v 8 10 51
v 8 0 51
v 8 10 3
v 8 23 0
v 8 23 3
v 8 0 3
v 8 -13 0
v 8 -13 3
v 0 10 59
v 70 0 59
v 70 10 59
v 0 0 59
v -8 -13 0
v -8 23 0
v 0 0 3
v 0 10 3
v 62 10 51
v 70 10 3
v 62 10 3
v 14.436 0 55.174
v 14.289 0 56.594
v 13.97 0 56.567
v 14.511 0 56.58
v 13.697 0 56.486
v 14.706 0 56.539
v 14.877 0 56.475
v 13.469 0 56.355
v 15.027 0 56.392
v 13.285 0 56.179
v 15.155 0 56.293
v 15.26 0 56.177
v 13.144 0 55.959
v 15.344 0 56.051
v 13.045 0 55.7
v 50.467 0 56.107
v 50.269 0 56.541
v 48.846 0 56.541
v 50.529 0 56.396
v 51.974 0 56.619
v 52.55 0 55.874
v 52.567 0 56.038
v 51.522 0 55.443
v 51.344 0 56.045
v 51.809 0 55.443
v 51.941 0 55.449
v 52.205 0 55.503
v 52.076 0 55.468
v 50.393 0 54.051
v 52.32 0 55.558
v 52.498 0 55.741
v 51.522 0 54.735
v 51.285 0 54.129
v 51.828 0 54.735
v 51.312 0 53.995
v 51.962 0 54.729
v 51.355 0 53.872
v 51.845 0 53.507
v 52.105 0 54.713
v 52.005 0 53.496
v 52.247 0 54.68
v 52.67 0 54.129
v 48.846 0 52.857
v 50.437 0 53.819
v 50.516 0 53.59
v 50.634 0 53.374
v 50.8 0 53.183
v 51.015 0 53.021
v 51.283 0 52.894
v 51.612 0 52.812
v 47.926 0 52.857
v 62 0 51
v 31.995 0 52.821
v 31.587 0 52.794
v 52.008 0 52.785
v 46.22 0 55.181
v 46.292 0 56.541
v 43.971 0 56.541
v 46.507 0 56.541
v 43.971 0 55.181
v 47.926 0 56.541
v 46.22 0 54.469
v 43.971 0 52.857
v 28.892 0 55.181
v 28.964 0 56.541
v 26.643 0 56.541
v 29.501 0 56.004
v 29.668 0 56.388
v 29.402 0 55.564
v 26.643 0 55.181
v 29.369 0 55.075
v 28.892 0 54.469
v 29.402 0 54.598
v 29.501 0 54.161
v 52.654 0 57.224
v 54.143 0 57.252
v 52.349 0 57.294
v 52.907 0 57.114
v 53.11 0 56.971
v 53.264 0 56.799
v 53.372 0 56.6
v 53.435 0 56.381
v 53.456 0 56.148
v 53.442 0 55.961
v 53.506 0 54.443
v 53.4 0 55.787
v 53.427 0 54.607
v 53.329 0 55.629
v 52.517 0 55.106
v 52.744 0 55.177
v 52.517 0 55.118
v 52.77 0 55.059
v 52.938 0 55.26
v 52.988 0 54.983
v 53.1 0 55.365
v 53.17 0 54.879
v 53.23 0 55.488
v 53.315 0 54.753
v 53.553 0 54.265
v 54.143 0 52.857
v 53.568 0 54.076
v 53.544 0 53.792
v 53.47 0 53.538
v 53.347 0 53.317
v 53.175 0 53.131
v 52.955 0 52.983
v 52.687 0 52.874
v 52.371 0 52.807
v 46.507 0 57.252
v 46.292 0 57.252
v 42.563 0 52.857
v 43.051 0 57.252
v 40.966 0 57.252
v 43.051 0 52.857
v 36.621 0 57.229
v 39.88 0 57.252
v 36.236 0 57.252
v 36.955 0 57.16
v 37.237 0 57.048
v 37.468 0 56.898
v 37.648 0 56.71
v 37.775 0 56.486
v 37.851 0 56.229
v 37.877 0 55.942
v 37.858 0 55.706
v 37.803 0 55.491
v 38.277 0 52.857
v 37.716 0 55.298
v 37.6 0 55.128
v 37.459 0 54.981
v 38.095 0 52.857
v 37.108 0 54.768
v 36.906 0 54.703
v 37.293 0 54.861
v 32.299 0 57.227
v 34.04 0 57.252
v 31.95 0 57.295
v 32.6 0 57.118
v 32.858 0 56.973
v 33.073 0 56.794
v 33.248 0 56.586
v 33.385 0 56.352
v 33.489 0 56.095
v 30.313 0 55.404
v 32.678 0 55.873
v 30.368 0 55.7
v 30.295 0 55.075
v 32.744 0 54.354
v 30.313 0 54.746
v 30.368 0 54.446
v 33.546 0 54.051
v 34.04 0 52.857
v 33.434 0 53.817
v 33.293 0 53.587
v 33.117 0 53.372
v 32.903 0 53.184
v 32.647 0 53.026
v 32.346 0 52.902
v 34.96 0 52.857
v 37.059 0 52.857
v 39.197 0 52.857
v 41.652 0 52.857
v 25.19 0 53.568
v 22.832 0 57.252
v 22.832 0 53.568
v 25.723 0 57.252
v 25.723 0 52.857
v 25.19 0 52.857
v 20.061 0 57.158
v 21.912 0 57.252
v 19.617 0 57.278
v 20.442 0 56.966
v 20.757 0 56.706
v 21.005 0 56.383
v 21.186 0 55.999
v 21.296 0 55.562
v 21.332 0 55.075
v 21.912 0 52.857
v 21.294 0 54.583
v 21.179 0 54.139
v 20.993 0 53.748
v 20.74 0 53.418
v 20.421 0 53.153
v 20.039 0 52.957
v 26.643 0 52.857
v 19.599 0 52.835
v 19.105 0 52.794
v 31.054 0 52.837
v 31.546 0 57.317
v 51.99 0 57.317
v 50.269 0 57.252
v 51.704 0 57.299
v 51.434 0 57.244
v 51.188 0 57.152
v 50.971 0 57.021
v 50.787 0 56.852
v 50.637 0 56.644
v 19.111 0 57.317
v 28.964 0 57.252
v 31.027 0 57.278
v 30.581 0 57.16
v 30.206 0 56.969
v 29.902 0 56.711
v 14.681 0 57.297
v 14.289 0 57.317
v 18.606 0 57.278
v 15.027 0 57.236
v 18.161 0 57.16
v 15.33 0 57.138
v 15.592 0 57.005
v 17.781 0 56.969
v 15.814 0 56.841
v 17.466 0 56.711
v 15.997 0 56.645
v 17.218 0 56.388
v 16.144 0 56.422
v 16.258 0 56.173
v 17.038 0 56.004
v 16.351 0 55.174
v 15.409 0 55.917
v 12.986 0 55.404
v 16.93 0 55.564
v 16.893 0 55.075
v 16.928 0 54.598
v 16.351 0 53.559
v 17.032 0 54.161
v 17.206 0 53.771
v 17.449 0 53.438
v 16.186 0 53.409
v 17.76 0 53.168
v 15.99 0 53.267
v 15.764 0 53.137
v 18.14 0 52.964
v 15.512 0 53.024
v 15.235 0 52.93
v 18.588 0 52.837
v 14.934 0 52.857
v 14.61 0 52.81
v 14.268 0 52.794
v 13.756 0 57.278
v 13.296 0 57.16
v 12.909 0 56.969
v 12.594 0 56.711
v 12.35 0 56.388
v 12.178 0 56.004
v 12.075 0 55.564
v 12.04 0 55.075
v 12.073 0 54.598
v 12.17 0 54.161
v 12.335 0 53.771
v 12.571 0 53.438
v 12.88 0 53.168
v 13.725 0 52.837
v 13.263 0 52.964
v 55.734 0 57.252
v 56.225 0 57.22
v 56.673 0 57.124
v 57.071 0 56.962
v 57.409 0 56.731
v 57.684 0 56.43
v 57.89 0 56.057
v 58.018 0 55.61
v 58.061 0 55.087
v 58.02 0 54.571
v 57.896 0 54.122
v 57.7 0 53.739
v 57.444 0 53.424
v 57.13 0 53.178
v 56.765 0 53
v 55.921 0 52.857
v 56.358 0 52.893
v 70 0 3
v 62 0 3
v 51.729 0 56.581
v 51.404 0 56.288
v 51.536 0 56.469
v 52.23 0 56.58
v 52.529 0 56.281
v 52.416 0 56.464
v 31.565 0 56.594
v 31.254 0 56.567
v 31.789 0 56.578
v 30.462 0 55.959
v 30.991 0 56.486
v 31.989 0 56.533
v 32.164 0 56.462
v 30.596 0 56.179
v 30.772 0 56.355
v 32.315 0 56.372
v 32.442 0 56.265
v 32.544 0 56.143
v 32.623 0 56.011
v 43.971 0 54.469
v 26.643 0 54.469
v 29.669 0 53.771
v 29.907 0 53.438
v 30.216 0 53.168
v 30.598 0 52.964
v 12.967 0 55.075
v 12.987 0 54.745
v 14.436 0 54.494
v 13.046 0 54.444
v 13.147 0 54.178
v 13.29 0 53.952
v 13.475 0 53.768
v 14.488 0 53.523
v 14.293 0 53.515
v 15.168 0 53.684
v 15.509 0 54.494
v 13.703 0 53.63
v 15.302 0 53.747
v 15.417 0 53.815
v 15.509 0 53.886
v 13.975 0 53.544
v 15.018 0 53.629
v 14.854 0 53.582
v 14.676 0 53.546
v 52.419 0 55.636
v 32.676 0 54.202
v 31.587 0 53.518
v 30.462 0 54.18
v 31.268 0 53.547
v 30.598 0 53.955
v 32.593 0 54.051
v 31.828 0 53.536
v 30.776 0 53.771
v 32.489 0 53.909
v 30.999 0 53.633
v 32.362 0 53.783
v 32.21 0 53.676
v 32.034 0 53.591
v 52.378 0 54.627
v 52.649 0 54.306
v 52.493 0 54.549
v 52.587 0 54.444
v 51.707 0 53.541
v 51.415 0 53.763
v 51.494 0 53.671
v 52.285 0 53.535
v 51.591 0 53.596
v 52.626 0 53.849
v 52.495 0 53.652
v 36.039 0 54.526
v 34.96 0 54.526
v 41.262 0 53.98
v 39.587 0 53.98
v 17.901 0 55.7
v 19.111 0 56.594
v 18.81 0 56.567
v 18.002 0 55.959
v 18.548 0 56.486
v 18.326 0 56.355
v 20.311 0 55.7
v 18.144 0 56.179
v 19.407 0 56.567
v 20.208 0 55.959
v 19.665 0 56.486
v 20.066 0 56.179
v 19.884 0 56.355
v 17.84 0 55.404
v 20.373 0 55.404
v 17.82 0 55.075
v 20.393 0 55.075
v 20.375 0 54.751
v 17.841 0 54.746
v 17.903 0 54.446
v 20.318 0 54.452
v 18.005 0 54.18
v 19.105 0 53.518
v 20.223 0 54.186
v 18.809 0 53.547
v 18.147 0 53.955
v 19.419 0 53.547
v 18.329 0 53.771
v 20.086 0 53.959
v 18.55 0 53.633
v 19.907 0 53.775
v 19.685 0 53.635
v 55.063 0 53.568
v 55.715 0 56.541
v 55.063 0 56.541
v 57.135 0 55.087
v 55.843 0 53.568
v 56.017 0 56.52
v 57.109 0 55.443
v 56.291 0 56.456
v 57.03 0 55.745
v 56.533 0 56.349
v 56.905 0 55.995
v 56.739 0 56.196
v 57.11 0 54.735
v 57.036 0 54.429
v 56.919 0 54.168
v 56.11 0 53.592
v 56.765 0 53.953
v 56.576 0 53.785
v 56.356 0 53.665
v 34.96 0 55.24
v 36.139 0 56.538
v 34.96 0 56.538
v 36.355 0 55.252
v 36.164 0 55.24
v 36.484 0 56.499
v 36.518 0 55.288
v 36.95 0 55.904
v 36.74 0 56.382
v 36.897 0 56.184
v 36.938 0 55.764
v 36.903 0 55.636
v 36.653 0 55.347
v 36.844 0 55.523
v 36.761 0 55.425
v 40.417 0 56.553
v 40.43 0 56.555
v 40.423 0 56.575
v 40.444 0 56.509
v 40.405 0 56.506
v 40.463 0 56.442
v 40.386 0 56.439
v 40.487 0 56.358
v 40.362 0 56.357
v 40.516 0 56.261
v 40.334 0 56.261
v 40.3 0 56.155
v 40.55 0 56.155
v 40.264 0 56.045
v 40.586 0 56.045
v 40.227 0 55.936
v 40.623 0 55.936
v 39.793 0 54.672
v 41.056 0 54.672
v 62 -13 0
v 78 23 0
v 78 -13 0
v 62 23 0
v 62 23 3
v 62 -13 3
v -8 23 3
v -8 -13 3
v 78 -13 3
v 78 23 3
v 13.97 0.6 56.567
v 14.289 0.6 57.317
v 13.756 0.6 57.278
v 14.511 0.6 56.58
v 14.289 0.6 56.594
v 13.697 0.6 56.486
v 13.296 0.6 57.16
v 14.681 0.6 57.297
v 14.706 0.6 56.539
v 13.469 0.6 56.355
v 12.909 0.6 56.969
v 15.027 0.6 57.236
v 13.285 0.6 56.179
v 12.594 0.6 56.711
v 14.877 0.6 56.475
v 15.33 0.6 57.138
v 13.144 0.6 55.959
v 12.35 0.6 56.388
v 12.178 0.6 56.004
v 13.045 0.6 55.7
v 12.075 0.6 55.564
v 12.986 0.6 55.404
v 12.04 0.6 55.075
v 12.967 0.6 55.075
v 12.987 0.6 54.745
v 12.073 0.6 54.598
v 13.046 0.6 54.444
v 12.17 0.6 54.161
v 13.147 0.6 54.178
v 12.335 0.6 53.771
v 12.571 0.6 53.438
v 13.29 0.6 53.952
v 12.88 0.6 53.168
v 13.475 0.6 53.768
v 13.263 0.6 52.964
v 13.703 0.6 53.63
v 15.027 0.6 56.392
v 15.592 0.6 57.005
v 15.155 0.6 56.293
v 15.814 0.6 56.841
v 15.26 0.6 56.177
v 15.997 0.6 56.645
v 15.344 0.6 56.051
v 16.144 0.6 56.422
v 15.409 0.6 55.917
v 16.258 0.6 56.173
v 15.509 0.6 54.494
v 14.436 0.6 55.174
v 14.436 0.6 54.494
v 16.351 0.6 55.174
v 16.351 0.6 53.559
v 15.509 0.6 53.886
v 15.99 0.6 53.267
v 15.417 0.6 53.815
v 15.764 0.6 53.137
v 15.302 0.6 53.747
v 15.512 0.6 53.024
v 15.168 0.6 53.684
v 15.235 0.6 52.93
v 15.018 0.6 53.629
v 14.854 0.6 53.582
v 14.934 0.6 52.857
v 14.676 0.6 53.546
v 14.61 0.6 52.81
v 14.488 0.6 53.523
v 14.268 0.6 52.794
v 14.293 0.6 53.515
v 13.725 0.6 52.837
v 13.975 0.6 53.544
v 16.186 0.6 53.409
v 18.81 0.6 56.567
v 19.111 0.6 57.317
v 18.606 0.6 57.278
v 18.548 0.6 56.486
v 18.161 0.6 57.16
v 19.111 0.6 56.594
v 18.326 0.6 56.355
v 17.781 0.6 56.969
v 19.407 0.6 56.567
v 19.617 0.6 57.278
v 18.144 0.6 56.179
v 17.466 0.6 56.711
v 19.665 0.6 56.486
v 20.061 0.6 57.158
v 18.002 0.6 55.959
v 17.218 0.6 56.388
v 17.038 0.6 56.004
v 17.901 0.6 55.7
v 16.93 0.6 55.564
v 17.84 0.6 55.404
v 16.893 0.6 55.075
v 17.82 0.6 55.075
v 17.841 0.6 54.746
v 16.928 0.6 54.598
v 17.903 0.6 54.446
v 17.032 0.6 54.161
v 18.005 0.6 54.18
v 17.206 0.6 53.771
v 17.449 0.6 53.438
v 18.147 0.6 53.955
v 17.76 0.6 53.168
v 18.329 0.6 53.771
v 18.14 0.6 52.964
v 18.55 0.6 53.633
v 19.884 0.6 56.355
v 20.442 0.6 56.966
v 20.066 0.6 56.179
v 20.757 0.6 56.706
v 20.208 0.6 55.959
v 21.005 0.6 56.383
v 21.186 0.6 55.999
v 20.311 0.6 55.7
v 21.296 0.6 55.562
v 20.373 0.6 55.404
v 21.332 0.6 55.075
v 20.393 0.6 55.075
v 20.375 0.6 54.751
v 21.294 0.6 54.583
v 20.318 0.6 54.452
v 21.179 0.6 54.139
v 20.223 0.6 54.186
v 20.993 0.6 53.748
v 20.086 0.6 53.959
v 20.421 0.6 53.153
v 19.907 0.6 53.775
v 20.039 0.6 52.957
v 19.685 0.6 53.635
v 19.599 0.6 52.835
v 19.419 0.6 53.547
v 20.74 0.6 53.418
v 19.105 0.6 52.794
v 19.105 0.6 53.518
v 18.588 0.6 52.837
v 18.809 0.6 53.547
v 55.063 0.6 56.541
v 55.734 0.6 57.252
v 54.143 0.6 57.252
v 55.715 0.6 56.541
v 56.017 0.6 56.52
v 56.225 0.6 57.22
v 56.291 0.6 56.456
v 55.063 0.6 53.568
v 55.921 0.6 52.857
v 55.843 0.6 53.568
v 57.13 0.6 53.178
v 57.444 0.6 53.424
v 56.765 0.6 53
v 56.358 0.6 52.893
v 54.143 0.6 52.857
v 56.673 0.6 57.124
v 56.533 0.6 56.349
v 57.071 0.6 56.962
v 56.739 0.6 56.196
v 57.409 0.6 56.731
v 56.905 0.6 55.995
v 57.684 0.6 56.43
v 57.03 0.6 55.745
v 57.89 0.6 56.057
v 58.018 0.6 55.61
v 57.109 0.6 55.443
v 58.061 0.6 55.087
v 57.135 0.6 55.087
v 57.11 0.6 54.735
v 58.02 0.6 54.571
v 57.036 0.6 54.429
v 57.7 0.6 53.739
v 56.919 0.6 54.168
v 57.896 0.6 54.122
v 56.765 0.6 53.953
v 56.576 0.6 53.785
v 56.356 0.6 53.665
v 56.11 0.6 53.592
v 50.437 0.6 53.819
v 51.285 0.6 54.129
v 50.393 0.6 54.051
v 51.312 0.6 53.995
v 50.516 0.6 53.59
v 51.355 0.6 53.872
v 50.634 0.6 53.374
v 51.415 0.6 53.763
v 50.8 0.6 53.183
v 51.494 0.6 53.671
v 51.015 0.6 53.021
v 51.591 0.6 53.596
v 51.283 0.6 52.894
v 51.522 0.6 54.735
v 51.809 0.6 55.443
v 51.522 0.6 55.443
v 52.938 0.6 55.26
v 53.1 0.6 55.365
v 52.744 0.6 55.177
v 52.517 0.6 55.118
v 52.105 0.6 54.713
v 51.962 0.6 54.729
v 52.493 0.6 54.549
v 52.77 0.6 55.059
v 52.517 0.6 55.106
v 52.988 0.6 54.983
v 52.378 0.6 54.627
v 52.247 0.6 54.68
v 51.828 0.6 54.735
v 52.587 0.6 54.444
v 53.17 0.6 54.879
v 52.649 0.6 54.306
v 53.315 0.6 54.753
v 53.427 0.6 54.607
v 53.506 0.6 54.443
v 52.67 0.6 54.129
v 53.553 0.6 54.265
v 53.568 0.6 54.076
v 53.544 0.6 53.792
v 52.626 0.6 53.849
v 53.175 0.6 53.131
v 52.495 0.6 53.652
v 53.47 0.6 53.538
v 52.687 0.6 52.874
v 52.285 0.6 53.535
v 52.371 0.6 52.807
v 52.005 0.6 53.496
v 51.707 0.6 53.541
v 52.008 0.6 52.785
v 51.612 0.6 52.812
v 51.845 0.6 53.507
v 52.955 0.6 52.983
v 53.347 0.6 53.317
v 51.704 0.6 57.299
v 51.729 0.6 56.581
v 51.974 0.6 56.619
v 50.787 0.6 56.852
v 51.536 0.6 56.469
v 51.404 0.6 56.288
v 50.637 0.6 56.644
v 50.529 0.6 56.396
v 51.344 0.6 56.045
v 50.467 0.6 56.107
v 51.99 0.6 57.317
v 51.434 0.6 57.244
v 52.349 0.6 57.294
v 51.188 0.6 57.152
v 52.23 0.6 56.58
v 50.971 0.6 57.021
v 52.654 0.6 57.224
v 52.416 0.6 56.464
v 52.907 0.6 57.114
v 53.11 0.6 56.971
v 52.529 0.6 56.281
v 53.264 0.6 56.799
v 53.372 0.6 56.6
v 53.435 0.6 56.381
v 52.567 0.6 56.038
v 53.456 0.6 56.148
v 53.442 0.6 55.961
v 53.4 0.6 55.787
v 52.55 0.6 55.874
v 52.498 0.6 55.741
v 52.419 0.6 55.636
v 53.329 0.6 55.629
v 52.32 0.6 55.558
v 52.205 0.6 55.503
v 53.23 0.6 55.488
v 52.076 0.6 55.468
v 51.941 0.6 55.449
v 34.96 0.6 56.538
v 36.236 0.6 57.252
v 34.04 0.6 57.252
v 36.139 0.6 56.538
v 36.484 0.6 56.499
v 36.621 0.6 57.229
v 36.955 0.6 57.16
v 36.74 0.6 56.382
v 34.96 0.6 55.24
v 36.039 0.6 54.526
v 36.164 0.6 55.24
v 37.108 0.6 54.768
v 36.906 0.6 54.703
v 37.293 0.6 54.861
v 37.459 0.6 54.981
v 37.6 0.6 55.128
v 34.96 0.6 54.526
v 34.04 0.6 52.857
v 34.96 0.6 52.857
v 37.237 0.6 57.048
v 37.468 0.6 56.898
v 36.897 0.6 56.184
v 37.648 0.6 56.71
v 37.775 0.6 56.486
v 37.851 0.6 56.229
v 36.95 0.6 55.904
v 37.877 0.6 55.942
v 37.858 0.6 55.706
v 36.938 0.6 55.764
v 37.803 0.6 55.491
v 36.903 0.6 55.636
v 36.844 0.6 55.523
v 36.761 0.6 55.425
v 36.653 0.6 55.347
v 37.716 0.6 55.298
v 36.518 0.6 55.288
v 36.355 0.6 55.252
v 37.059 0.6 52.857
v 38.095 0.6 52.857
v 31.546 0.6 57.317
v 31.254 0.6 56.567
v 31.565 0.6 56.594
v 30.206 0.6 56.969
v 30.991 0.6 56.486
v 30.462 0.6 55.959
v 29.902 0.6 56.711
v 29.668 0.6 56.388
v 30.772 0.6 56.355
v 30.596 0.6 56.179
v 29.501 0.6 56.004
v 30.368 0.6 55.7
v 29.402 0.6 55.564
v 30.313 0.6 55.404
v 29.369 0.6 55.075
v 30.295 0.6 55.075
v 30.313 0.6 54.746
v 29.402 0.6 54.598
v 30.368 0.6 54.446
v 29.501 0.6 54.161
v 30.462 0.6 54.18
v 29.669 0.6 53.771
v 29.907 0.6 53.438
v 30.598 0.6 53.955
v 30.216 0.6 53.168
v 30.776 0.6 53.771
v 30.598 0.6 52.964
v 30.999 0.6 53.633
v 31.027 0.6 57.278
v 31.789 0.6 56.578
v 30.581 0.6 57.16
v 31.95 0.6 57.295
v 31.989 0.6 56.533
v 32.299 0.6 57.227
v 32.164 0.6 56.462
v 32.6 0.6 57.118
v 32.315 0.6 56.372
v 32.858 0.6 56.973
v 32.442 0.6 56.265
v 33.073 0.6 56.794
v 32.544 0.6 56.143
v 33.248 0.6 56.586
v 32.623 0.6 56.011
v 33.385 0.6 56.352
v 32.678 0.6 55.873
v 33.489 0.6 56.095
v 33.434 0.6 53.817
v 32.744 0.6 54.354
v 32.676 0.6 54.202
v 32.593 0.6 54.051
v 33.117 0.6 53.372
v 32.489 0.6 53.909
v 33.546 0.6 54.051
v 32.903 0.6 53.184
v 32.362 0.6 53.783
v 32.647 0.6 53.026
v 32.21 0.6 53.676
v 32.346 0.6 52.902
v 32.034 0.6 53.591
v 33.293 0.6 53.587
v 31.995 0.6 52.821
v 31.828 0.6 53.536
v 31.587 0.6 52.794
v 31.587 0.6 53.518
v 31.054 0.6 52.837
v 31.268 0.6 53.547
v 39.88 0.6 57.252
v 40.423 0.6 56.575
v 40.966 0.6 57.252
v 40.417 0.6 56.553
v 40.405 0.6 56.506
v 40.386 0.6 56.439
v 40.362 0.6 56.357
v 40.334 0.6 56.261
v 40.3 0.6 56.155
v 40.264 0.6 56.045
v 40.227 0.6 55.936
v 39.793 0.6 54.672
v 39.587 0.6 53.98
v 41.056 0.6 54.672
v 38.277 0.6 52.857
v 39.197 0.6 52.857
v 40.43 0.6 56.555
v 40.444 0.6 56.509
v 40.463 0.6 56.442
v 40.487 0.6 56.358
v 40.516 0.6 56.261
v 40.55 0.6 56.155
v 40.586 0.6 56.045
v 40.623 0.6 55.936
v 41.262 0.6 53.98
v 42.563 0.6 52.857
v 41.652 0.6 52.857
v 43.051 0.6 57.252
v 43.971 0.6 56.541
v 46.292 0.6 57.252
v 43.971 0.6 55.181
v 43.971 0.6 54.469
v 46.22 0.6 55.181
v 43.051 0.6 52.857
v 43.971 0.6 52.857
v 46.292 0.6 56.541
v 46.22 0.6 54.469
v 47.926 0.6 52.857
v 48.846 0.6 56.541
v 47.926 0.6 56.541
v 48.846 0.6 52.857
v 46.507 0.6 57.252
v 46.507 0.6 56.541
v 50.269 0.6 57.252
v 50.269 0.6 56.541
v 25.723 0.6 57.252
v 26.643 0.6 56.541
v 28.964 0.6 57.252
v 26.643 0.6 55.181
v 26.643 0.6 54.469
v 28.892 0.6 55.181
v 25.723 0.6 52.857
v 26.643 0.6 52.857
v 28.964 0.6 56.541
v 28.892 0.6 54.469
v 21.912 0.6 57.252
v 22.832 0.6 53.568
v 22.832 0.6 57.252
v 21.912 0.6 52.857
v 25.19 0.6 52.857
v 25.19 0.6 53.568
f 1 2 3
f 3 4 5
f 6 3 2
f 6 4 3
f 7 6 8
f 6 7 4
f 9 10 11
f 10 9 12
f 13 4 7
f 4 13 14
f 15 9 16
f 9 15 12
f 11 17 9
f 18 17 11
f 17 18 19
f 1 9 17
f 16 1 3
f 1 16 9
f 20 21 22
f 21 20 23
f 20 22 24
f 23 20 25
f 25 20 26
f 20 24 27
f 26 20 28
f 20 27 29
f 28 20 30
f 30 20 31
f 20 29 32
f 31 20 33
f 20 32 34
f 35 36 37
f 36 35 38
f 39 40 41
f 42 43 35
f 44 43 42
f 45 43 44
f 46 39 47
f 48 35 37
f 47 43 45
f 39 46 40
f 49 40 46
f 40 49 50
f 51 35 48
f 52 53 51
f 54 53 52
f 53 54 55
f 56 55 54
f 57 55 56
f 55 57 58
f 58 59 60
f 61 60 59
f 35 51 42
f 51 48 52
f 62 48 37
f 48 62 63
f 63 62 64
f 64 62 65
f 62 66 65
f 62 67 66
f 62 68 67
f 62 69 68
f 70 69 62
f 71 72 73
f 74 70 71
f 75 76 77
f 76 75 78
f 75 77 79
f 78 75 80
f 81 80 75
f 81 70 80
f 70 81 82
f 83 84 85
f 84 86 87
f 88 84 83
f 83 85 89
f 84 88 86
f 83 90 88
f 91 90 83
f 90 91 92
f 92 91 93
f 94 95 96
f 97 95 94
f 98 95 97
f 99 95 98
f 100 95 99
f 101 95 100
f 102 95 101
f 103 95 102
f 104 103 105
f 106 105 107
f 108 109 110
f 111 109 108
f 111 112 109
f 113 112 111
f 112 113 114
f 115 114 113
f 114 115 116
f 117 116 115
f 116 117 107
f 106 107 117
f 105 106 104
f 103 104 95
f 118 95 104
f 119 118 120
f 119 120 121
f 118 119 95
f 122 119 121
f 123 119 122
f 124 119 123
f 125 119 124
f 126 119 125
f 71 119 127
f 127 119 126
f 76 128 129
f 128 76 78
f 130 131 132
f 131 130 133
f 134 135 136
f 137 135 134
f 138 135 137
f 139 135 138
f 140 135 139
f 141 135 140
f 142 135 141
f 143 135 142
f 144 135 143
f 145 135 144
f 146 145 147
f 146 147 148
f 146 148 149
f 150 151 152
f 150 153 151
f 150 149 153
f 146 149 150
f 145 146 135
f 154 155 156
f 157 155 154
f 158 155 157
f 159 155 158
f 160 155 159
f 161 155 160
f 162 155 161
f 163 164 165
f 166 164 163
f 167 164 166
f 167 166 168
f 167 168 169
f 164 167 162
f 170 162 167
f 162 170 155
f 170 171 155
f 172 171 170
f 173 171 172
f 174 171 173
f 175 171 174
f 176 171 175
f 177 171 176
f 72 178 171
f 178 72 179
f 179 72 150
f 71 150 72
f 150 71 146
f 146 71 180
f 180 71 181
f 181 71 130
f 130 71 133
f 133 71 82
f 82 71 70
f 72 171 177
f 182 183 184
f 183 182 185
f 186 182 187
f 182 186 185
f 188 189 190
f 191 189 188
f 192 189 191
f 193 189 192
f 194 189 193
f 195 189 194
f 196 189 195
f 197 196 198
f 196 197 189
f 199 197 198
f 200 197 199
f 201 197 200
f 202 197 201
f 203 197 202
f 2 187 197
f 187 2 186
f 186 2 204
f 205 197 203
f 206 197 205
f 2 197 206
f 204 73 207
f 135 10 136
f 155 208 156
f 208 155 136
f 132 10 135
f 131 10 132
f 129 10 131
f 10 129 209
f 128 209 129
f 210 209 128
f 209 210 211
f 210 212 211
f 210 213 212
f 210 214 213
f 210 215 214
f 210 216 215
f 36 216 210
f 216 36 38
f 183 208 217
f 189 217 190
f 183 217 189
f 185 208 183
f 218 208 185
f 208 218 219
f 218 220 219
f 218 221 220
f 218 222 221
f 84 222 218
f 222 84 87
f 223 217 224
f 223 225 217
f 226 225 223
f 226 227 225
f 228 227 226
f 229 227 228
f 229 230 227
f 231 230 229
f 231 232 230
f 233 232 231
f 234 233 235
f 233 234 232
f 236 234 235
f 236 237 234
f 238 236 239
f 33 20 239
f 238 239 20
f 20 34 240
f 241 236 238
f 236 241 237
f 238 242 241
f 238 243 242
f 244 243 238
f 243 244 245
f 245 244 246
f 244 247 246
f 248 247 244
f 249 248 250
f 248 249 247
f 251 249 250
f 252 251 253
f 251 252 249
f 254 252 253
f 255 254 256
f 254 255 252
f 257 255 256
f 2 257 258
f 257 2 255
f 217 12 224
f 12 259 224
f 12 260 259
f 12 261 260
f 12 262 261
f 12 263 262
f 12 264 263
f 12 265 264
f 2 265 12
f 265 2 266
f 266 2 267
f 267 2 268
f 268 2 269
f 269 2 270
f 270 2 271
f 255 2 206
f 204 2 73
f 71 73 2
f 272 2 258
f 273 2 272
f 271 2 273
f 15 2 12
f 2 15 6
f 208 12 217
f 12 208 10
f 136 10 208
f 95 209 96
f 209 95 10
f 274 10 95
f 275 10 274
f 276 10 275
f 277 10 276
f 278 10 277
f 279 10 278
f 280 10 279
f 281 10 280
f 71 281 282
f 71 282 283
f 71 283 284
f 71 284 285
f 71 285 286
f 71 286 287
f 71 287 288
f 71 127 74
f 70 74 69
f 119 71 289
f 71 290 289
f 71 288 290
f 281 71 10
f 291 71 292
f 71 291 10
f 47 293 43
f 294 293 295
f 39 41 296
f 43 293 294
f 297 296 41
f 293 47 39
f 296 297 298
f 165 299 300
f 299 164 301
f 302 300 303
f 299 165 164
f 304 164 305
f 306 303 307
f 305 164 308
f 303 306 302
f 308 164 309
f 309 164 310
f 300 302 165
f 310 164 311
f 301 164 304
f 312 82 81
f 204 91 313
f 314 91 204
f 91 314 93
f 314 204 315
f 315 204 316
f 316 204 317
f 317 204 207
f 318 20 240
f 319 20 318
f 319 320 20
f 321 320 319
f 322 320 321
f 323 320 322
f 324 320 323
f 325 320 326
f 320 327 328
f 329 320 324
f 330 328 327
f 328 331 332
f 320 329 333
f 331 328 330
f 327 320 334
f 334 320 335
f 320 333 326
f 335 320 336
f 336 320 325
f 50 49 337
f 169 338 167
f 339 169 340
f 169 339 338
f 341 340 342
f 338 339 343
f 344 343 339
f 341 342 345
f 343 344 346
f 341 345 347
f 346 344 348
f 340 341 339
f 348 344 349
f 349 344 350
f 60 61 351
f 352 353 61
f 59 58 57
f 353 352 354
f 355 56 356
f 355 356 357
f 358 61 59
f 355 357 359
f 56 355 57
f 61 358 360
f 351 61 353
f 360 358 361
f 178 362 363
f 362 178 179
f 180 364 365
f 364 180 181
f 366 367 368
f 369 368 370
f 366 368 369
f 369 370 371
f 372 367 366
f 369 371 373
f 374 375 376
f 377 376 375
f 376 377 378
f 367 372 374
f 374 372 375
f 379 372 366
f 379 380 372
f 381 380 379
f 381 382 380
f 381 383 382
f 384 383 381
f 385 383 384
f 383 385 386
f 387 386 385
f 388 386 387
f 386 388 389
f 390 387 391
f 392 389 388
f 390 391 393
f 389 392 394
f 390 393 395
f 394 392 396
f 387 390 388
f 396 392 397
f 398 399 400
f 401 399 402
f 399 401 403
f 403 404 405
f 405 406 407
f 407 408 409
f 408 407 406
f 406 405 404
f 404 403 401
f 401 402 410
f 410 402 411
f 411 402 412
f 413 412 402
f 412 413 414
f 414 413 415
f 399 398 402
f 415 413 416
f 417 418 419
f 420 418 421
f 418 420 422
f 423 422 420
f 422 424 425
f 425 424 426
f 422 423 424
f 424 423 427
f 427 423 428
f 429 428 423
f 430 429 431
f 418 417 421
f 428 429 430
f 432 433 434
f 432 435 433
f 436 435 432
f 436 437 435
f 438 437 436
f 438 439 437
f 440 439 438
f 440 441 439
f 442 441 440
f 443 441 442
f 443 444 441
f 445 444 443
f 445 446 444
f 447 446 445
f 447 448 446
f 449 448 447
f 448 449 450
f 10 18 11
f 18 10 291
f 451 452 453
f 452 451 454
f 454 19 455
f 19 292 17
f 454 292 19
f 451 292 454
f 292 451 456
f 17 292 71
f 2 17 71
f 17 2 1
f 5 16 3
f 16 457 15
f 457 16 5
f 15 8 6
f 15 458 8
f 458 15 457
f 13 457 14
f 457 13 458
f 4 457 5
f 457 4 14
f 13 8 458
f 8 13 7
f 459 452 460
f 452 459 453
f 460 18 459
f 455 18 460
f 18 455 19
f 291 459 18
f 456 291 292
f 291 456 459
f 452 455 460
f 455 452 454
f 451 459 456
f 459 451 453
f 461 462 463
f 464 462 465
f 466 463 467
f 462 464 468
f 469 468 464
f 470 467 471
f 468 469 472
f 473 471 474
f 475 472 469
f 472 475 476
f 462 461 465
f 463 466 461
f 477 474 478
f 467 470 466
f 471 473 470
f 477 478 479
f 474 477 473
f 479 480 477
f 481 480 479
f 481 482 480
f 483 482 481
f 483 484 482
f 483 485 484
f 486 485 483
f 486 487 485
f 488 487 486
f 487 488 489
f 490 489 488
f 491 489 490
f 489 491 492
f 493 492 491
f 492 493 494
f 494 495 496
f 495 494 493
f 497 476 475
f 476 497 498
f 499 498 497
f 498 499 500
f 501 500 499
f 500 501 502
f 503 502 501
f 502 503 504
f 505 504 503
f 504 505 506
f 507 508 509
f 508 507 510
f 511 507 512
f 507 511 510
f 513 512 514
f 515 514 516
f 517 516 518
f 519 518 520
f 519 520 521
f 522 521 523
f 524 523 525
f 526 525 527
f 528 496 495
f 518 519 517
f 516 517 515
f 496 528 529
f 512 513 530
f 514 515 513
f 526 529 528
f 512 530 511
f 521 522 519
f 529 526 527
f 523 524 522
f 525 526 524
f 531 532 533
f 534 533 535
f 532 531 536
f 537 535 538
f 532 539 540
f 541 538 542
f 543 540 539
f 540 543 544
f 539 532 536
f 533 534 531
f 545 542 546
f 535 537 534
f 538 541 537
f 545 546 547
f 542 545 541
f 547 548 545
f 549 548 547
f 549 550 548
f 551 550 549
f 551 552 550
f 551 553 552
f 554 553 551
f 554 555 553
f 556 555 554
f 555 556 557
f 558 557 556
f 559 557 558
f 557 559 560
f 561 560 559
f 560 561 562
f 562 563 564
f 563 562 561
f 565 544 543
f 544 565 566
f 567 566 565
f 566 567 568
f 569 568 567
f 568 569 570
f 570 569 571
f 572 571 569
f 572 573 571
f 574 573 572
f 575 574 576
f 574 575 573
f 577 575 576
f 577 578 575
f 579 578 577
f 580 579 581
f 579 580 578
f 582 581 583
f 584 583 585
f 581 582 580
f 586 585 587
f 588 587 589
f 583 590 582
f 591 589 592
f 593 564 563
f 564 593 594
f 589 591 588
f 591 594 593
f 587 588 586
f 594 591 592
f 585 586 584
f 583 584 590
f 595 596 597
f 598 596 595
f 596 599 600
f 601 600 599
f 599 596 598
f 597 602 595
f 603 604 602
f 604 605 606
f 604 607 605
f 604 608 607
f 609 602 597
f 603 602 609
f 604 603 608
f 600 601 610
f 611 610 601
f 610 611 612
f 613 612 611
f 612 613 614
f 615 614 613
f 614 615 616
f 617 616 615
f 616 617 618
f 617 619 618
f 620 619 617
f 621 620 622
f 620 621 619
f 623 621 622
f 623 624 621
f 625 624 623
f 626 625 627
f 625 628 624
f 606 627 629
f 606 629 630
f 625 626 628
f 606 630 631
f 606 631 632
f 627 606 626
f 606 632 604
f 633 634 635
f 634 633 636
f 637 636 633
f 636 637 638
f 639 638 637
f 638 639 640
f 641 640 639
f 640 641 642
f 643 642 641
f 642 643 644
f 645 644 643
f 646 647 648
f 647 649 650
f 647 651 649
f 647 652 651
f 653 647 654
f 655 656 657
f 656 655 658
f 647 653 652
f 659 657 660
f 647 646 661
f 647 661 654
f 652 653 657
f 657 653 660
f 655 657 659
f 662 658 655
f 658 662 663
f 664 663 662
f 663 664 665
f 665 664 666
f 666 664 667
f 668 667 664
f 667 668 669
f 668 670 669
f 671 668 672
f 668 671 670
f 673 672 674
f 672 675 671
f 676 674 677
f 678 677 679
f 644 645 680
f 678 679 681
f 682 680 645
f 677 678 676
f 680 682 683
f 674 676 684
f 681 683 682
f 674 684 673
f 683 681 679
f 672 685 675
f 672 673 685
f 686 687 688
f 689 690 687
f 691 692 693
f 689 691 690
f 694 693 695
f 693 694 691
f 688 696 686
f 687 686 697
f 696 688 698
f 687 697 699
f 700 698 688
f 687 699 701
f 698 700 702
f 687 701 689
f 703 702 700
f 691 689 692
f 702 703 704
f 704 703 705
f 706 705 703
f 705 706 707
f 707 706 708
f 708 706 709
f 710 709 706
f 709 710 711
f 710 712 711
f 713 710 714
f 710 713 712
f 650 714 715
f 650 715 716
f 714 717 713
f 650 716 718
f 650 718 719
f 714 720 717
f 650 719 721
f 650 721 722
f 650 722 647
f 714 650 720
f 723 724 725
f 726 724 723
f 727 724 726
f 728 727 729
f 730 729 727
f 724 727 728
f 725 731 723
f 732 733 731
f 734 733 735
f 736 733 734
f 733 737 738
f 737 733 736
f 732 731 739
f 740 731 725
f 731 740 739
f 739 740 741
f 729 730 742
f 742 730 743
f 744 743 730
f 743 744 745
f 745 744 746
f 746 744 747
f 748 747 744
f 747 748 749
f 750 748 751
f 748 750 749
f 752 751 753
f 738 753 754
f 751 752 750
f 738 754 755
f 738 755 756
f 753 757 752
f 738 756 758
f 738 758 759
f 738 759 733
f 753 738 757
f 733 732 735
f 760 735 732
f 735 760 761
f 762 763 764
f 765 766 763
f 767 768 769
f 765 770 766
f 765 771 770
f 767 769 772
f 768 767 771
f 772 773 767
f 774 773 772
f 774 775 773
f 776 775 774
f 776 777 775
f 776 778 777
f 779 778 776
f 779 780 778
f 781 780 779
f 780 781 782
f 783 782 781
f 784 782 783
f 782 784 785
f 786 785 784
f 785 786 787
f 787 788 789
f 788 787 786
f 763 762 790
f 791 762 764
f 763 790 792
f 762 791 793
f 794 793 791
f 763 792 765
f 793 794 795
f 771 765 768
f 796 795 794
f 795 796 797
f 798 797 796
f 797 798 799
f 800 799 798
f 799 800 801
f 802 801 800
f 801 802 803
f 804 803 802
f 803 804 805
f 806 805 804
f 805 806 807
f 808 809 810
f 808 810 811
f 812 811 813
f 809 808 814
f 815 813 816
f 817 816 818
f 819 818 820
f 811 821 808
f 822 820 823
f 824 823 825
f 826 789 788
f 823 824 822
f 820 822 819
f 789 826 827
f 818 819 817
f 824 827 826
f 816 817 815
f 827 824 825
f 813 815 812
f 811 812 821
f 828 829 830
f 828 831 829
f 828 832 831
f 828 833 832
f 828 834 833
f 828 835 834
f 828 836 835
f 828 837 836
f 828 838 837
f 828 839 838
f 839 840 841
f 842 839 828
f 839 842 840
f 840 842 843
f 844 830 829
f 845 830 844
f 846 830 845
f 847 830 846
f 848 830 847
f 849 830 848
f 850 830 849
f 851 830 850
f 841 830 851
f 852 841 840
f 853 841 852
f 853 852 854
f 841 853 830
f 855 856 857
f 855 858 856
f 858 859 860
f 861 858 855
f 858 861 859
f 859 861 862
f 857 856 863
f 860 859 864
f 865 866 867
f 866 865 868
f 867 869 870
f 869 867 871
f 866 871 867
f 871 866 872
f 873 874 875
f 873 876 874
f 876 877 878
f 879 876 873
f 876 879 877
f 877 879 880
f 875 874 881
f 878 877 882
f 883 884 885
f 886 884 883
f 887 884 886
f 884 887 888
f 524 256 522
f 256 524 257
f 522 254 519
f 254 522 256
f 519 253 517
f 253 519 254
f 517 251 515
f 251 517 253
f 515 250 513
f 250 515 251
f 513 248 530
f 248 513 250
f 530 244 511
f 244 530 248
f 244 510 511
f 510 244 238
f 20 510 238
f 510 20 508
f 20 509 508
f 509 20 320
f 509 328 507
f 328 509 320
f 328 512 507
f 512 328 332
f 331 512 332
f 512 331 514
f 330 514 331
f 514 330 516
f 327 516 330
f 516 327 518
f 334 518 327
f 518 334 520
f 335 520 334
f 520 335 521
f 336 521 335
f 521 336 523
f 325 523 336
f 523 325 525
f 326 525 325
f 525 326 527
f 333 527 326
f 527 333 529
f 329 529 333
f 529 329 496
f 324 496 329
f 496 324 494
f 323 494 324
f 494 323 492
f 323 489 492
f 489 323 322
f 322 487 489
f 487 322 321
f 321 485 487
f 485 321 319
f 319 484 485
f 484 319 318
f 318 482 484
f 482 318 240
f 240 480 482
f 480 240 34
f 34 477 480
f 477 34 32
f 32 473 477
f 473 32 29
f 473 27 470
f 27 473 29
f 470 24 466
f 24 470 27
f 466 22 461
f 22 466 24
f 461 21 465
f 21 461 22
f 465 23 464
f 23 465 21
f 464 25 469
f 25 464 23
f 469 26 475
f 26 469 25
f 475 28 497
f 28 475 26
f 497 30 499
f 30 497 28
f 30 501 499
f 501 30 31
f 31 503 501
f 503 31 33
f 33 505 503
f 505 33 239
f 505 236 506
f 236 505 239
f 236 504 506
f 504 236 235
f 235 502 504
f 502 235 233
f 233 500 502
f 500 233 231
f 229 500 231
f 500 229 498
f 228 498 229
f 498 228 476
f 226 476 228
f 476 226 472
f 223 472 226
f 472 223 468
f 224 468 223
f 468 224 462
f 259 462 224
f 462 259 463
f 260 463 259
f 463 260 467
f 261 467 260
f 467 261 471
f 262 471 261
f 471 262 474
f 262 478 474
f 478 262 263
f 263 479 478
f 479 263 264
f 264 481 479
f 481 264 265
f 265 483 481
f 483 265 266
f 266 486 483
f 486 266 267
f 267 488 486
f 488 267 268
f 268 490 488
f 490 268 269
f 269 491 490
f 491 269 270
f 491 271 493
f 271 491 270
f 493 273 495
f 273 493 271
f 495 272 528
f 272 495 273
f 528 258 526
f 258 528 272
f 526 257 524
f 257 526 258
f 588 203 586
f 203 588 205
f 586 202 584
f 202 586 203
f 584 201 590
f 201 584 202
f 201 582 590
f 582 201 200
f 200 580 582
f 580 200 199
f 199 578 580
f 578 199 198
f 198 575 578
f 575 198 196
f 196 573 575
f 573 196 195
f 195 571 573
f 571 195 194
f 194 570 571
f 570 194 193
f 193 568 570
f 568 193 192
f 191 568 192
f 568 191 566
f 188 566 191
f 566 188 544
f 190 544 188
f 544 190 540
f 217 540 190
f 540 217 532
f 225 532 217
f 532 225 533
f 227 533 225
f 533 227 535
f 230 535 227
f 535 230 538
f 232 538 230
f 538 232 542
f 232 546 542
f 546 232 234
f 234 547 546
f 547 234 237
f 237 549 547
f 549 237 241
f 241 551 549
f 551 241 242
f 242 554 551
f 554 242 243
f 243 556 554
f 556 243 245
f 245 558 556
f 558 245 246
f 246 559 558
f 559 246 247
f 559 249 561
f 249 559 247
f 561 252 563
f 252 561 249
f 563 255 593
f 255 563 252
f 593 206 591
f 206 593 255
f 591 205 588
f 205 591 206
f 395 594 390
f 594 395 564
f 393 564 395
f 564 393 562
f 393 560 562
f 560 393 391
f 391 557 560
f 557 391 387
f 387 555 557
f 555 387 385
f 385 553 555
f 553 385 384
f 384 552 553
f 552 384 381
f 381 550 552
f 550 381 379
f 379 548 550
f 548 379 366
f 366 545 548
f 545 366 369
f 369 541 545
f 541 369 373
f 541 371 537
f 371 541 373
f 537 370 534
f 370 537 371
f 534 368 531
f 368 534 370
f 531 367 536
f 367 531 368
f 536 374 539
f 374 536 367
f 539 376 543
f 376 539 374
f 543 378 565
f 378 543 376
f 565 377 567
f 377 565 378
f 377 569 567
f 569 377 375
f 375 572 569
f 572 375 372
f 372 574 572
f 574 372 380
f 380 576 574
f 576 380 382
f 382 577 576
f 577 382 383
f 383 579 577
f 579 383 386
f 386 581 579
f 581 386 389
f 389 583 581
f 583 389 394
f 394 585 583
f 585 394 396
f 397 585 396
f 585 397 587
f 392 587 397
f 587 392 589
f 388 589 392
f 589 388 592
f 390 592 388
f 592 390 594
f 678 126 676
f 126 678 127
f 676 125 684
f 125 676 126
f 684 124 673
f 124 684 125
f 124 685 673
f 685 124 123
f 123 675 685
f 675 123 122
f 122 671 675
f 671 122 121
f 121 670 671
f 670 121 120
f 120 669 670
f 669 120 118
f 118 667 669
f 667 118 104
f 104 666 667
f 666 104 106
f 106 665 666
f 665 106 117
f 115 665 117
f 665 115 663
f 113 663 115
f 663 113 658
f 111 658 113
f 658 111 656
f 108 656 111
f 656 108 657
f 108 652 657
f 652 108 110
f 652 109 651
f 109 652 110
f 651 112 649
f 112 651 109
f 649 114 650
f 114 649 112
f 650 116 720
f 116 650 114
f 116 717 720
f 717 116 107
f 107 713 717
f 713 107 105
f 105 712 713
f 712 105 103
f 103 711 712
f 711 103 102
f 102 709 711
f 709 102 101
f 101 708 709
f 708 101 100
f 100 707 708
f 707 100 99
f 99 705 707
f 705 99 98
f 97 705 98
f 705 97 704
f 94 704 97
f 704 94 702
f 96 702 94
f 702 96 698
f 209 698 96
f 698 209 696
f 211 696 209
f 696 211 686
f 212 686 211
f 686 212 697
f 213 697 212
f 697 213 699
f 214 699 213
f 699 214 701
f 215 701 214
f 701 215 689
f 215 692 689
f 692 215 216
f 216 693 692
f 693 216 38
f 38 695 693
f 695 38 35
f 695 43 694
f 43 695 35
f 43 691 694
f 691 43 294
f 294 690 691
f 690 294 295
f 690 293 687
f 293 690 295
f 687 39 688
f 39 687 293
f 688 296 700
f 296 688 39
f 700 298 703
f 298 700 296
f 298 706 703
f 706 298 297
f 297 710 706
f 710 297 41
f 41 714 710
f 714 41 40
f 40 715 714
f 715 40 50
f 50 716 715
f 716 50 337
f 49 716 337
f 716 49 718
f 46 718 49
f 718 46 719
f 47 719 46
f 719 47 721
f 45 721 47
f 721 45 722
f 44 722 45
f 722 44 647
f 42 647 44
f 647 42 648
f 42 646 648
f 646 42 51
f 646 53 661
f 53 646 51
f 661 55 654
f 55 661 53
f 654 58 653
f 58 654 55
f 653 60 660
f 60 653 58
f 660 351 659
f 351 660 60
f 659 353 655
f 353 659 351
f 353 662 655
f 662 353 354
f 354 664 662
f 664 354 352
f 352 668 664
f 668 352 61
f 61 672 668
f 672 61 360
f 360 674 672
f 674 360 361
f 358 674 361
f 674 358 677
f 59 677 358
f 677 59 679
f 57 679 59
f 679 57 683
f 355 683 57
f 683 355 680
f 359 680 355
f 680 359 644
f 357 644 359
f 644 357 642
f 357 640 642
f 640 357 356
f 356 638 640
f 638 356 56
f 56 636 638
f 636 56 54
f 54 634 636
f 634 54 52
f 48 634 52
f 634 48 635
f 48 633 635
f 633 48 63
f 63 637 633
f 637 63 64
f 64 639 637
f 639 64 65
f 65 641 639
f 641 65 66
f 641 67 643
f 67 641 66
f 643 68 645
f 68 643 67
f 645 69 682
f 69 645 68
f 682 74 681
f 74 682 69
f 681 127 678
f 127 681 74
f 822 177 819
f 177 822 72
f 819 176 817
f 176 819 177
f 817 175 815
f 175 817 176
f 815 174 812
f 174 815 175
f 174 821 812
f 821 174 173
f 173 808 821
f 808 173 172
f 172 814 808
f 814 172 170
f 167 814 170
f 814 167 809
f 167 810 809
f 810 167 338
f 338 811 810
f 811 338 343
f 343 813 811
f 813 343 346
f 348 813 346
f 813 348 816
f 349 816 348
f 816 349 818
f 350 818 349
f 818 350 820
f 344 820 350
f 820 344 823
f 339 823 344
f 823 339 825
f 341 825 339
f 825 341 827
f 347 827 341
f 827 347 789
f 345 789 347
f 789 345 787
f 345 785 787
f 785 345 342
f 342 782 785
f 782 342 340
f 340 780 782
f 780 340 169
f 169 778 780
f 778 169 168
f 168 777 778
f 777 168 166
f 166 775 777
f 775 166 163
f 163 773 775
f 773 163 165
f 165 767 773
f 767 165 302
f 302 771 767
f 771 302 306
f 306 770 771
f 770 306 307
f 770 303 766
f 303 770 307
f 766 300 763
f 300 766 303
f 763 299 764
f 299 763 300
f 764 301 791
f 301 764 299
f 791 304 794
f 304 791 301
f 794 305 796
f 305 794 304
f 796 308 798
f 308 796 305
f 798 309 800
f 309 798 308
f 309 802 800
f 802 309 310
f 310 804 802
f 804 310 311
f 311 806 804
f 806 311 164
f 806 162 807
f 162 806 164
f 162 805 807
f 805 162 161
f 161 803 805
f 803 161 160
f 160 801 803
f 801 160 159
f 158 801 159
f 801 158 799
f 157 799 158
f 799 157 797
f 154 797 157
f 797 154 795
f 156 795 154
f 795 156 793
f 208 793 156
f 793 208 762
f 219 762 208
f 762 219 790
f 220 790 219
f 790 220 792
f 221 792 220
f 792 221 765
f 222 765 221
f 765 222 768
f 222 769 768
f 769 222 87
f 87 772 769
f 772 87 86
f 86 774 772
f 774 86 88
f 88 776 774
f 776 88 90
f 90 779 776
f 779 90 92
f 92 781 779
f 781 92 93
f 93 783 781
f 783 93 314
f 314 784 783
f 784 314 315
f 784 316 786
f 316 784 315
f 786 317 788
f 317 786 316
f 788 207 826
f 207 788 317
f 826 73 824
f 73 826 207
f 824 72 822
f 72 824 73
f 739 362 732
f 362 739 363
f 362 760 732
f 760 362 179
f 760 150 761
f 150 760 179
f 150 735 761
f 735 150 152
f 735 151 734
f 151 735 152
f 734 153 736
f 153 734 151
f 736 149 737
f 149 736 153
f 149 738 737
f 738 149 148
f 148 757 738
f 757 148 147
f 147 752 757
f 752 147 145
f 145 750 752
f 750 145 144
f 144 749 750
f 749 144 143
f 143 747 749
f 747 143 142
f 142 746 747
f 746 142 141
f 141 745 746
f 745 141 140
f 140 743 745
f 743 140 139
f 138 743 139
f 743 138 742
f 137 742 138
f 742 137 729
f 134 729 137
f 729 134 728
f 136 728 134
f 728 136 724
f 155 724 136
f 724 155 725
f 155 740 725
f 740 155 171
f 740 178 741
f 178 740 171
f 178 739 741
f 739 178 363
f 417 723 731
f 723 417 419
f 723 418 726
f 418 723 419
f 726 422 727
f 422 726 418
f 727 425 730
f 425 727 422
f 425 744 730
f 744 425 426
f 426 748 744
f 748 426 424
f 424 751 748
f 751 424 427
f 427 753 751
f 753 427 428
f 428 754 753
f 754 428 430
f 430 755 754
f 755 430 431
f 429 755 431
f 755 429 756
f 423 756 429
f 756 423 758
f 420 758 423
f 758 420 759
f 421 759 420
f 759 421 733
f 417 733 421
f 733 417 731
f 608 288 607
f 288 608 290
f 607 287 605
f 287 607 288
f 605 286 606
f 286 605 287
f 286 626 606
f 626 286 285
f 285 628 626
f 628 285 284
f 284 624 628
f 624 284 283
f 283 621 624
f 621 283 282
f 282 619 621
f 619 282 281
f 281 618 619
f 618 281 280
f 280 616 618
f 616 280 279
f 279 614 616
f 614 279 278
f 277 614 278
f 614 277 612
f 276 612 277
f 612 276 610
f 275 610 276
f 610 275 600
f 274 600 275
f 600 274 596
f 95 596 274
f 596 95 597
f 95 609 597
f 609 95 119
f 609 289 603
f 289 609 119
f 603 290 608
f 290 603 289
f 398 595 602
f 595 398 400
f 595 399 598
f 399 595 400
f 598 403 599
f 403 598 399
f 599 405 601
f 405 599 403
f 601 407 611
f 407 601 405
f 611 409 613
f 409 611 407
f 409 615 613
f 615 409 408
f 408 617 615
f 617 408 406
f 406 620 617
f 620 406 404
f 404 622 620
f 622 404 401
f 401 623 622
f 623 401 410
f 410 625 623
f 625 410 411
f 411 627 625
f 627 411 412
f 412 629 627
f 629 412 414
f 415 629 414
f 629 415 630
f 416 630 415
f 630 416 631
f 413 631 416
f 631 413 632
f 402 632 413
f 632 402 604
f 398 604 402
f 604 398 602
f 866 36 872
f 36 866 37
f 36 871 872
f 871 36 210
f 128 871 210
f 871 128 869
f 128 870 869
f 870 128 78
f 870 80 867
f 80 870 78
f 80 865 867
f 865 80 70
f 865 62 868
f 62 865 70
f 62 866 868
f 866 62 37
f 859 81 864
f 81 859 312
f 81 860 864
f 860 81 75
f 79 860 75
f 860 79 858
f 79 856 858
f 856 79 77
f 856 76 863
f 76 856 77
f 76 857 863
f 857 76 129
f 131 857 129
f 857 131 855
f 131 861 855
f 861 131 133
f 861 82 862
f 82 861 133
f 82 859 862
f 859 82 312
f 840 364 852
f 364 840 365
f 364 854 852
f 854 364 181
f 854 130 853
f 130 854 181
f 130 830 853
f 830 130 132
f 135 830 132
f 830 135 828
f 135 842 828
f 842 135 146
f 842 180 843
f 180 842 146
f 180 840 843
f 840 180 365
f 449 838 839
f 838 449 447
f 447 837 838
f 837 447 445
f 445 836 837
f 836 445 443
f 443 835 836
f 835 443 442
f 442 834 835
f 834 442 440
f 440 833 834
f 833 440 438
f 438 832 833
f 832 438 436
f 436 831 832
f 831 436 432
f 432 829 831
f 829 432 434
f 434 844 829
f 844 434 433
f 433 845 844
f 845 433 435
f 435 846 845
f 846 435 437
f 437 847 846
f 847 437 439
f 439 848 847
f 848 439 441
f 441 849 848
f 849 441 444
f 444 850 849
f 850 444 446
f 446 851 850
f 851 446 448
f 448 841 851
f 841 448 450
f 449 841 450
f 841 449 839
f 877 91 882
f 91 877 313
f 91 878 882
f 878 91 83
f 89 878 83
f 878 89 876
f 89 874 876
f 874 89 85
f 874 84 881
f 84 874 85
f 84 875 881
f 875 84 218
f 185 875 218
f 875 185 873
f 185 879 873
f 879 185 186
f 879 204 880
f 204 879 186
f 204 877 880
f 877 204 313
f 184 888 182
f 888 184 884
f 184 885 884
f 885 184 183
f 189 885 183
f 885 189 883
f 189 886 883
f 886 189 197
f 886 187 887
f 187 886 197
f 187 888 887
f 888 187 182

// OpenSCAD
// GolfCraft3D — Arco de putting (diseño propio)
// La bola (Ø 42,67 mm) tiene que pasar por debajo del arco: entrena la línea de salida del putt.
// Se imprime parado, tal cual, sin soportes (el travesaño es un puente de 54 mm).

luz_ancho = 54;    // espacio libre entre postes (bola + ~5,6 mm por lado)
luz_alto  = 48;    // altura libre bajo el travesaño
poste     = 8;     // ancho de cada poste (eje X)
fondo     = 10;    // profundidad de postes y travesaño (eje Y)
viga      = 8;     // alto del travesaño
pie_largo = 36;    // largo de cada pie (eje Y), para que no se caiga
pie_ancho = 16;    // ancho de cada pie (eje X)
pie_alto  = 3;
texto     = "GOLFCRAFT3D";

ancho_total = luz_ancho + 2 * poste;
alto_total  = pie_alto + luz_alto + viga;

module pie(x) {
    // el pie se extiende hacia afuera del arco para no estorbar a la bola
    translate([x, -pie_largo / 2 + fondo / 2, 0])
        cube([pie_ancho, pie_largo, pie_alto]);
}

difference() {
    union() {
        // postes
        cube([poste, fondo, alto_total]);
        translate([ancho_total - poste, 0, 0]) cube([poste, fondo, alto_total]);
        // travesaño
        translate([0, 0, alto_total - viga]) cube([ancho_total, fondo, viga]);
        // pies (hacia afuera)
        pie(poste - pie_ancho);
        pie(ancho_total - poste);
    }
    // texto grabado en el frente del travesaño
    translate([ancho_total / 2, 0.6, alto_total - viga / 2])
        rotate([90, 0, 0])
            linear_extrude(1)
                text(texto, size = 4.6, font = "Liberation Sans:style=Bold",
                     halign = "center", valign = "center");
}
